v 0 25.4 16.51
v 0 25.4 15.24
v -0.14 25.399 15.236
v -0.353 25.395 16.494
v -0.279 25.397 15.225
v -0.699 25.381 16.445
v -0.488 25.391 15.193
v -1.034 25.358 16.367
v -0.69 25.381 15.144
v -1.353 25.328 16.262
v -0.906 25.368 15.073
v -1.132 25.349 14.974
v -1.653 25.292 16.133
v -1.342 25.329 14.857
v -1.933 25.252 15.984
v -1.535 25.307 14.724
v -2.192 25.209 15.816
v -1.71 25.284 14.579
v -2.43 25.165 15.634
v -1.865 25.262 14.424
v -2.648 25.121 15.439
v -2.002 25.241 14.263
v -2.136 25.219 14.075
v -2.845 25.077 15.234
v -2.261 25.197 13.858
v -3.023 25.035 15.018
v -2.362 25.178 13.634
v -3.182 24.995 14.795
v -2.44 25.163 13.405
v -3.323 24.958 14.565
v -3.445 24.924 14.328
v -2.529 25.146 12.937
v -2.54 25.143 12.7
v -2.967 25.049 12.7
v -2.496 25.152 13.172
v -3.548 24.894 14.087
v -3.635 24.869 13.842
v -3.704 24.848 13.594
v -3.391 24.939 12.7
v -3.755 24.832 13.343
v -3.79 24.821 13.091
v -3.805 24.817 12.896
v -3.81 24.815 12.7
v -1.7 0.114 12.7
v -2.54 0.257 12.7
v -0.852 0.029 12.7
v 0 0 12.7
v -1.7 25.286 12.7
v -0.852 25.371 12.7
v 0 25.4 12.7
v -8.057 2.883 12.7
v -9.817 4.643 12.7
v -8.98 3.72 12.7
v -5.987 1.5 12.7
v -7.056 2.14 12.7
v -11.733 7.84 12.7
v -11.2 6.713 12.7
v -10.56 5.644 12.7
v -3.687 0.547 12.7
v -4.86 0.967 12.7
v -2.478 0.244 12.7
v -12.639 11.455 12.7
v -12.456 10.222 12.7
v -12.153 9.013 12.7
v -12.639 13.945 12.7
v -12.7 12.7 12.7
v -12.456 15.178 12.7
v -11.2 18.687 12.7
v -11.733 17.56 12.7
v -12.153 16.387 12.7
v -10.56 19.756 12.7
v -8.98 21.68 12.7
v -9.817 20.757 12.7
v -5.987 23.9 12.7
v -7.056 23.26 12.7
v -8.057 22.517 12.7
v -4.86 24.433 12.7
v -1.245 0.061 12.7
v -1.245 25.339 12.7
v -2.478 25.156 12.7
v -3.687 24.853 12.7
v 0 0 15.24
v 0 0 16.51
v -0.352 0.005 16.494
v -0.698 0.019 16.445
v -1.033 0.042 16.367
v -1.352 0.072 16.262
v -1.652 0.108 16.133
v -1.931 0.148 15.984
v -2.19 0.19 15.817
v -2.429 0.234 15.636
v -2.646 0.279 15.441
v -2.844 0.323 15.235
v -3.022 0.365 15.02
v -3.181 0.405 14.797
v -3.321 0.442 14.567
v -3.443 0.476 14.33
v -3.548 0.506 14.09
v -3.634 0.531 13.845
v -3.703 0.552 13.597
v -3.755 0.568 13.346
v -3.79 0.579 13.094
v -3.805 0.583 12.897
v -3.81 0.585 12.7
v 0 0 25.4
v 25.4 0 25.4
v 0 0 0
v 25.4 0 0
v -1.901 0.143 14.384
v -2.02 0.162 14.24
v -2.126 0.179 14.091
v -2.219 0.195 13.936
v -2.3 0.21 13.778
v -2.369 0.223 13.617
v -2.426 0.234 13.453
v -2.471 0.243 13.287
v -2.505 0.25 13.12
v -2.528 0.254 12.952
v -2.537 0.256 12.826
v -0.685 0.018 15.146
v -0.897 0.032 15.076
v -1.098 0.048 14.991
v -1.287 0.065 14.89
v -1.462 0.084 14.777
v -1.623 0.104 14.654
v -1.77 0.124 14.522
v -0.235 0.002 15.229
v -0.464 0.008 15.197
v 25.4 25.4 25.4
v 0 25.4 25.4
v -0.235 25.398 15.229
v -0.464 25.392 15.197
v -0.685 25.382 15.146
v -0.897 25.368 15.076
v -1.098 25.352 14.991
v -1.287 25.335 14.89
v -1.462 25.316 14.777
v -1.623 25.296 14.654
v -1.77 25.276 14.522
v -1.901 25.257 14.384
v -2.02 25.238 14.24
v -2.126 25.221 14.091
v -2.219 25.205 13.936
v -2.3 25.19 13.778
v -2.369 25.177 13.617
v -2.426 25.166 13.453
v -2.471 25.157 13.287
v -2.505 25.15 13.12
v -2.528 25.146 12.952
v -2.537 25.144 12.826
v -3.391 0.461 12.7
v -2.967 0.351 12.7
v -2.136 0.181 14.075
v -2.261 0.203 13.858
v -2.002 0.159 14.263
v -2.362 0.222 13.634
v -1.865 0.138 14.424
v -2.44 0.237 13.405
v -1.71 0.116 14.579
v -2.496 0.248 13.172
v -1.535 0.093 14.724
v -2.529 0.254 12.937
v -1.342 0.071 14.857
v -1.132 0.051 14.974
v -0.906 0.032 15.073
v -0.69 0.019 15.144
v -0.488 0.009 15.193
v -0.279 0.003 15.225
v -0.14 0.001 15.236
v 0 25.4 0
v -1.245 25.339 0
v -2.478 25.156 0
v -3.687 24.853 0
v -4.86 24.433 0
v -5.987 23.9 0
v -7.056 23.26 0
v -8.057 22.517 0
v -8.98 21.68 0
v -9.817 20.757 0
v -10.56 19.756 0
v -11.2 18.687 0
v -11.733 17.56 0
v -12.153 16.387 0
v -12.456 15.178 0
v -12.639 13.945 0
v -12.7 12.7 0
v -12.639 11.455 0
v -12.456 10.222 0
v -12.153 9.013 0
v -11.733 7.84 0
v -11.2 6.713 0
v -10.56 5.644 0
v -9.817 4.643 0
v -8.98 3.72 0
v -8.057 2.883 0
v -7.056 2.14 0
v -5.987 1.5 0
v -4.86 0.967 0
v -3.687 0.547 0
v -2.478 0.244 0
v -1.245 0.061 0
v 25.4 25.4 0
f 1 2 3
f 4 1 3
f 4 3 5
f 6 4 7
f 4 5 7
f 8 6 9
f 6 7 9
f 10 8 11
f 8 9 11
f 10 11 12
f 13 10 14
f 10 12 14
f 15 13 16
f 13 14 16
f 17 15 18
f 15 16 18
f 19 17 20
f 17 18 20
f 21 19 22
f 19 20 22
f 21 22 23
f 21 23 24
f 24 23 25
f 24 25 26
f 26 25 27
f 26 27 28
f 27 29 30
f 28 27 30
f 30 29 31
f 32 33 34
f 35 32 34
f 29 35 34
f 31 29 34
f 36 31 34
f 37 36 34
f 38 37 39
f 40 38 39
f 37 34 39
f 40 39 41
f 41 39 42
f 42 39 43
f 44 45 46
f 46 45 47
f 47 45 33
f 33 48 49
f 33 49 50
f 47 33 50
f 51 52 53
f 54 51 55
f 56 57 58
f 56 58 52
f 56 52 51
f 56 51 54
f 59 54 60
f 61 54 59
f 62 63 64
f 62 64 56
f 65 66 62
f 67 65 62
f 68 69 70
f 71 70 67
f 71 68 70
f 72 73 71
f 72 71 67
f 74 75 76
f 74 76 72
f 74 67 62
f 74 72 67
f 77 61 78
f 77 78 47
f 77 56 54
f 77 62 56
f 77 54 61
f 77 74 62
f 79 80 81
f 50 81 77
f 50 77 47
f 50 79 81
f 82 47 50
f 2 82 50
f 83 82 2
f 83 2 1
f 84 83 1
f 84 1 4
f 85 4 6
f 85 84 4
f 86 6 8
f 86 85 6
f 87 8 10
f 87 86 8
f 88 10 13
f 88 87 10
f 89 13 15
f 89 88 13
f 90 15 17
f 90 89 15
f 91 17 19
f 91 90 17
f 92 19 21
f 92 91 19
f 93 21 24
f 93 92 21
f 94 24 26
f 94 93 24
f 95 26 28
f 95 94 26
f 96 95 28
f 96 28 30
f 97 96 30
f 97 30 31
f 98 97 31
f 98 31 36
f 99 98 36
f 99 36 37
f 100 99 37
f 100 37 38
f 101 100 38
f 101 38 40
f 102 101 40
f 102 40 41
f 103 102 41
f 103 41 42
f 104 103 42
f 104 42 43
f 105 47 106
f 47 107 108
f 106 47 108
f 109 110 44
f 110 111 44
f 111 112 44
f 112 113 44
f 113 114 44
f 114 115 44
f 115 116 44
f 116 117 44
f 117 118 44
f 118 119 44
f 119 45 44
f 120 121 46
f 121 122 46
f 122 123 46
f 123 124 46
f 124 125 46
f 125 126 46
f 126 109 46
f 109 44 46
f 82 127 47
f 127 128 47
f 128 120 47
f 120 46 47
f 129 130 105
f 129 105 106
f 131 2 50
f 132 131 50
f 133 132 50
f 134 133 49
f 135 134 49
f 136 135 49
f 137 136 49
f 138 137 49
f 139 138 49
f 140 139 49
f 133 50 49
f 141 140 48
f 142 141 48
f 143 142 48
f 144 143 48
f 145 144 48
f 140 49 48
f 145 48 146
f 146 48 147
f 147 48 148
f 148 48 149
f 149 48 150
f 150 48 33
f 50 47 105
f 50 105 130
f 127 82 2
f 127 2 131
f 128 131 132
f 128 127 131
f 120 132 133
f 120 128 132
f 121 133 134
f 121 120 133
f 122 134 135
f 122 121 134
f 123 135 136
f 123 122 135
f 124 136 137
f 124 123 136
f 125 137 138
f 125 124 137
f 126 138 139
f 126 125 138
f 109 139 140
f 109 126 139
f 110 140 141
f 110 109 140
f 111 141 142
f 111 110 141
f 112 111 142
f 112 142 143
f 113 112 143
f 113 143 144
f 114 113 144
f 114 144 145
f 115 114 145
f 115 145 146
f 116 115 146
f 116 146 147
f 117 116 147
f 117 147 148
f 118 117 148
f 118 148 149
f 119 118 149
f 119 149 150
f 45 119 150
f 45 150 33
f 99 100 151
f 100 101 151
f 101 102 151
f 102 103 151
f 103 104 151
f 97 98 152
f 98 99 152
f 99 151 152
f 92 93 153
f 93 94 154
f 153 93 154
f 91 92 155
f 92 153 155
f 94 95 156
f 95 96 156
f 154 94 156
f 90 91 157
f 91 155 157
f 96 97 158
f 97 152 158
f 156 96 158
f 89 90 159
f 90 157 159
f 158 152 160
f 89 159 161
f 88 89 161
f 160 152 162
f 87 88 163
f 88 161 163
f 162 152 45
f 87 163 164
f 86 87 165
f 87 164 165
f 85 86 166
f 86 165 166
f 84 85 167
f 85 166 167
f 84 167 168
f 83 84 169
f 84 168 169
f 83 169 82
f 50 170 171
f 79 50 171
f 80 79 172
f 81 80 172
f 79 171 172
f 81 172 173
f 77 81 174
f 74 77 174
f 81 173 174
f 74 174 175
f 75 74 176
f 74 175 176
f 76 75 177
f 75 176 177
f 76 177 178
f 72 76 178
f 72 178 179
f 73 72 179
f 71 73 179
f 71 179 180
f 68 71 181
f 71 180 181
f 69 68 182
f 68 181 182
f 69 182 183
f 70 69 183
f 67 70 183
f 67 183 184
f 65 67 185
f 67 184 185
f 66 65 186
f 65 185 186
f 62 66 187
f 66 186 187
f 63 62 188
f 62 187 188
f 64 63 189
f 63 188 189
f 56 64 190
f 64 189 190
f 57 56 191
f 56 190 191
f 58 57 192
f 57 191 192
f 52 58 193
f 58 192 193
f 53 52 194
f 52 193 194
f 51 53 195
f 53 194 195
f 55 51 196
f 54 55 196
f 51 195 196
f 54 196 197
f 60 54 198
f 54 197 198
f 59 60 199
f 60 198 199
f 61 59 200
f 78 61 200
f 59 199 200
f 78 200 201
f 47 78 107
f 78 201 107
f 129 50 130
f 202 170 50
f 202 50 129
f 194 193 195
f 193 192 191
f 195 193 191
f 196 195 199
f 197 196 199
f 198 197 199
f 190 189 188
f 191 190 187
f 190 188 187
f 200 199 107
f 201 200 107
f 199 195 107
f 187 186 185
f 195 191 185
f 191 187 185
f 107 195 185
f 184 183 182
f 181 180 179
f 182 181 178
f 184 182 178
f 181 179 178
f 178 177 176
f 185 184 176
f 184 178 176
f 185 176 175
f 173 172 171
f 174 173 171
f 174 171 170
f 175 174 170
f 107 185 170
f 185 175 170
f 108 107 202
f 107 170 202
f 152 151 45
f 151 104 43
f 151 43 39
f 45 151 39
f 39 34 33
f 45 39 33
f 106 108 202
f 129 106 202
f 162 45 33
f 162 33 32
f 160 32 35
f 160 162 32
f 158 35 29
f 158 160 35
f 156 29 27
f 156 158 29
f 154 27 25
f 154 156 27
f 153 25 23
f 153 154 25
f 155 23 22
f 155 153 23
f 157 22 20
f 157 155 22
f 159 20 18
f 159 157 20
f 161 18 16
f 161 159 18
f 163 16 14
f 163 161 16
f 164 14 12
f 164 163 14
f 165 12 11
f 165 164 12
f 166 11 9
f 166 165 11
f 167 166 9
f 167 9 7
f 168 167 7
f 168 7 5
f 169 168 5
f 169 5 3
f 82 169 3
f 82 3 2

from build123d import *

# Parameters (mm, degrees)
F1_DEPTH  = 12.7
F0_W      = 25.4
F0_H      = 25.4
F2_DEPTH  = 25.4
F4_DEPTH  = 25.4
F6_DEPTH  = 25.4
F8_DEPTH  = 25.4
F10_DEPTH = 25.4


with BuildPart() as f1:
    # F0 (on Top) → F1 (new body)
    with BuildSketch(Plane.XY):
        with BuildLine():
            ThreePointArc((0, 25.4), (-12.7, 12.7), (0, 0))
            Line((0, 0), (0, 25.4))
        make_face()
    extrude(amount=F1_DEPTH)

    # F0 (on Top) → F2 (join)
    with BuildSketch(Plane.XY):
        with Locations((12.7, 12.7)):
            Rectangle(F0_W, F0_H)
    extrude(amount=F2_DEPTH)


with BuildPart() as f4:
    # F3 (on face) → F4 (new body)
    with BuildSketch(Plane.XZ):
        with BuildLine():
            Line((-2.54, 12.7), (0, 12.7))
            Line((0, 12.7), (0, 15.24))
            ThreePointArc((0, 15.24), (-1.796051, 14.496051), (-2.54, 12.7))
        make_face()
    extrude(amount=-F4_DEPTH)


with BuildPart() as f6:
    # F5 (on face) → F6 (new body)
    with BuildSketch(Plane.XZ):
        with BuildLine():
            Line((-3.81, 12.7), (-2.54, 12.7))
            ThreePointArc((-2.54, 12.7), (-1.796051, 14.496051), (0, 15.24))
            Line((0, 15.24), (0, 16.51))
            ThreePointArc((0, 16.51), (-2.694077, 15.394077), (-3.81, 12.7))
        make_face()
    extrude(amount=-F6_DEPTH)


with BuildPart() as f8:
    # F7 (on face) → F8 (new body)
    with BuildSketch(Plane.XY.offset(12.7)):
        with BuildLine():
            Line((0, 0), (0, 25.4))
            ThreePointArc((0, 25.4), (-12.7, 12.7), (0, 0))
        make_face()
    extrude(amount=F8_DEPTH)

    # F9: intersect F4
    add(f4.part, mode=Mode.INTERSECT)


with BuildPart() as f10:
    # F1_face (on face) → F10 (new body)
    with BuildSketch(Plane(origin=(-5.390047, 12.7, 12.7), x_dir=(1, 0, 0), z_dir=(0, 0, 1))):
        with BuildLine():
            Line((5.390047, -12.7), (5.390047, 12.7))
            ThreePointArc((5.390047, 12.7), (-7.309953, 0), (5.390047, -12.7))
        make_face()
    extrude(amount=F10_DEPTH)

    # F11: intersect F6
    add(f6.part, mode=Mode.INTERSECT)


solid = Compound([f1.part, f8.part, f10.part])
